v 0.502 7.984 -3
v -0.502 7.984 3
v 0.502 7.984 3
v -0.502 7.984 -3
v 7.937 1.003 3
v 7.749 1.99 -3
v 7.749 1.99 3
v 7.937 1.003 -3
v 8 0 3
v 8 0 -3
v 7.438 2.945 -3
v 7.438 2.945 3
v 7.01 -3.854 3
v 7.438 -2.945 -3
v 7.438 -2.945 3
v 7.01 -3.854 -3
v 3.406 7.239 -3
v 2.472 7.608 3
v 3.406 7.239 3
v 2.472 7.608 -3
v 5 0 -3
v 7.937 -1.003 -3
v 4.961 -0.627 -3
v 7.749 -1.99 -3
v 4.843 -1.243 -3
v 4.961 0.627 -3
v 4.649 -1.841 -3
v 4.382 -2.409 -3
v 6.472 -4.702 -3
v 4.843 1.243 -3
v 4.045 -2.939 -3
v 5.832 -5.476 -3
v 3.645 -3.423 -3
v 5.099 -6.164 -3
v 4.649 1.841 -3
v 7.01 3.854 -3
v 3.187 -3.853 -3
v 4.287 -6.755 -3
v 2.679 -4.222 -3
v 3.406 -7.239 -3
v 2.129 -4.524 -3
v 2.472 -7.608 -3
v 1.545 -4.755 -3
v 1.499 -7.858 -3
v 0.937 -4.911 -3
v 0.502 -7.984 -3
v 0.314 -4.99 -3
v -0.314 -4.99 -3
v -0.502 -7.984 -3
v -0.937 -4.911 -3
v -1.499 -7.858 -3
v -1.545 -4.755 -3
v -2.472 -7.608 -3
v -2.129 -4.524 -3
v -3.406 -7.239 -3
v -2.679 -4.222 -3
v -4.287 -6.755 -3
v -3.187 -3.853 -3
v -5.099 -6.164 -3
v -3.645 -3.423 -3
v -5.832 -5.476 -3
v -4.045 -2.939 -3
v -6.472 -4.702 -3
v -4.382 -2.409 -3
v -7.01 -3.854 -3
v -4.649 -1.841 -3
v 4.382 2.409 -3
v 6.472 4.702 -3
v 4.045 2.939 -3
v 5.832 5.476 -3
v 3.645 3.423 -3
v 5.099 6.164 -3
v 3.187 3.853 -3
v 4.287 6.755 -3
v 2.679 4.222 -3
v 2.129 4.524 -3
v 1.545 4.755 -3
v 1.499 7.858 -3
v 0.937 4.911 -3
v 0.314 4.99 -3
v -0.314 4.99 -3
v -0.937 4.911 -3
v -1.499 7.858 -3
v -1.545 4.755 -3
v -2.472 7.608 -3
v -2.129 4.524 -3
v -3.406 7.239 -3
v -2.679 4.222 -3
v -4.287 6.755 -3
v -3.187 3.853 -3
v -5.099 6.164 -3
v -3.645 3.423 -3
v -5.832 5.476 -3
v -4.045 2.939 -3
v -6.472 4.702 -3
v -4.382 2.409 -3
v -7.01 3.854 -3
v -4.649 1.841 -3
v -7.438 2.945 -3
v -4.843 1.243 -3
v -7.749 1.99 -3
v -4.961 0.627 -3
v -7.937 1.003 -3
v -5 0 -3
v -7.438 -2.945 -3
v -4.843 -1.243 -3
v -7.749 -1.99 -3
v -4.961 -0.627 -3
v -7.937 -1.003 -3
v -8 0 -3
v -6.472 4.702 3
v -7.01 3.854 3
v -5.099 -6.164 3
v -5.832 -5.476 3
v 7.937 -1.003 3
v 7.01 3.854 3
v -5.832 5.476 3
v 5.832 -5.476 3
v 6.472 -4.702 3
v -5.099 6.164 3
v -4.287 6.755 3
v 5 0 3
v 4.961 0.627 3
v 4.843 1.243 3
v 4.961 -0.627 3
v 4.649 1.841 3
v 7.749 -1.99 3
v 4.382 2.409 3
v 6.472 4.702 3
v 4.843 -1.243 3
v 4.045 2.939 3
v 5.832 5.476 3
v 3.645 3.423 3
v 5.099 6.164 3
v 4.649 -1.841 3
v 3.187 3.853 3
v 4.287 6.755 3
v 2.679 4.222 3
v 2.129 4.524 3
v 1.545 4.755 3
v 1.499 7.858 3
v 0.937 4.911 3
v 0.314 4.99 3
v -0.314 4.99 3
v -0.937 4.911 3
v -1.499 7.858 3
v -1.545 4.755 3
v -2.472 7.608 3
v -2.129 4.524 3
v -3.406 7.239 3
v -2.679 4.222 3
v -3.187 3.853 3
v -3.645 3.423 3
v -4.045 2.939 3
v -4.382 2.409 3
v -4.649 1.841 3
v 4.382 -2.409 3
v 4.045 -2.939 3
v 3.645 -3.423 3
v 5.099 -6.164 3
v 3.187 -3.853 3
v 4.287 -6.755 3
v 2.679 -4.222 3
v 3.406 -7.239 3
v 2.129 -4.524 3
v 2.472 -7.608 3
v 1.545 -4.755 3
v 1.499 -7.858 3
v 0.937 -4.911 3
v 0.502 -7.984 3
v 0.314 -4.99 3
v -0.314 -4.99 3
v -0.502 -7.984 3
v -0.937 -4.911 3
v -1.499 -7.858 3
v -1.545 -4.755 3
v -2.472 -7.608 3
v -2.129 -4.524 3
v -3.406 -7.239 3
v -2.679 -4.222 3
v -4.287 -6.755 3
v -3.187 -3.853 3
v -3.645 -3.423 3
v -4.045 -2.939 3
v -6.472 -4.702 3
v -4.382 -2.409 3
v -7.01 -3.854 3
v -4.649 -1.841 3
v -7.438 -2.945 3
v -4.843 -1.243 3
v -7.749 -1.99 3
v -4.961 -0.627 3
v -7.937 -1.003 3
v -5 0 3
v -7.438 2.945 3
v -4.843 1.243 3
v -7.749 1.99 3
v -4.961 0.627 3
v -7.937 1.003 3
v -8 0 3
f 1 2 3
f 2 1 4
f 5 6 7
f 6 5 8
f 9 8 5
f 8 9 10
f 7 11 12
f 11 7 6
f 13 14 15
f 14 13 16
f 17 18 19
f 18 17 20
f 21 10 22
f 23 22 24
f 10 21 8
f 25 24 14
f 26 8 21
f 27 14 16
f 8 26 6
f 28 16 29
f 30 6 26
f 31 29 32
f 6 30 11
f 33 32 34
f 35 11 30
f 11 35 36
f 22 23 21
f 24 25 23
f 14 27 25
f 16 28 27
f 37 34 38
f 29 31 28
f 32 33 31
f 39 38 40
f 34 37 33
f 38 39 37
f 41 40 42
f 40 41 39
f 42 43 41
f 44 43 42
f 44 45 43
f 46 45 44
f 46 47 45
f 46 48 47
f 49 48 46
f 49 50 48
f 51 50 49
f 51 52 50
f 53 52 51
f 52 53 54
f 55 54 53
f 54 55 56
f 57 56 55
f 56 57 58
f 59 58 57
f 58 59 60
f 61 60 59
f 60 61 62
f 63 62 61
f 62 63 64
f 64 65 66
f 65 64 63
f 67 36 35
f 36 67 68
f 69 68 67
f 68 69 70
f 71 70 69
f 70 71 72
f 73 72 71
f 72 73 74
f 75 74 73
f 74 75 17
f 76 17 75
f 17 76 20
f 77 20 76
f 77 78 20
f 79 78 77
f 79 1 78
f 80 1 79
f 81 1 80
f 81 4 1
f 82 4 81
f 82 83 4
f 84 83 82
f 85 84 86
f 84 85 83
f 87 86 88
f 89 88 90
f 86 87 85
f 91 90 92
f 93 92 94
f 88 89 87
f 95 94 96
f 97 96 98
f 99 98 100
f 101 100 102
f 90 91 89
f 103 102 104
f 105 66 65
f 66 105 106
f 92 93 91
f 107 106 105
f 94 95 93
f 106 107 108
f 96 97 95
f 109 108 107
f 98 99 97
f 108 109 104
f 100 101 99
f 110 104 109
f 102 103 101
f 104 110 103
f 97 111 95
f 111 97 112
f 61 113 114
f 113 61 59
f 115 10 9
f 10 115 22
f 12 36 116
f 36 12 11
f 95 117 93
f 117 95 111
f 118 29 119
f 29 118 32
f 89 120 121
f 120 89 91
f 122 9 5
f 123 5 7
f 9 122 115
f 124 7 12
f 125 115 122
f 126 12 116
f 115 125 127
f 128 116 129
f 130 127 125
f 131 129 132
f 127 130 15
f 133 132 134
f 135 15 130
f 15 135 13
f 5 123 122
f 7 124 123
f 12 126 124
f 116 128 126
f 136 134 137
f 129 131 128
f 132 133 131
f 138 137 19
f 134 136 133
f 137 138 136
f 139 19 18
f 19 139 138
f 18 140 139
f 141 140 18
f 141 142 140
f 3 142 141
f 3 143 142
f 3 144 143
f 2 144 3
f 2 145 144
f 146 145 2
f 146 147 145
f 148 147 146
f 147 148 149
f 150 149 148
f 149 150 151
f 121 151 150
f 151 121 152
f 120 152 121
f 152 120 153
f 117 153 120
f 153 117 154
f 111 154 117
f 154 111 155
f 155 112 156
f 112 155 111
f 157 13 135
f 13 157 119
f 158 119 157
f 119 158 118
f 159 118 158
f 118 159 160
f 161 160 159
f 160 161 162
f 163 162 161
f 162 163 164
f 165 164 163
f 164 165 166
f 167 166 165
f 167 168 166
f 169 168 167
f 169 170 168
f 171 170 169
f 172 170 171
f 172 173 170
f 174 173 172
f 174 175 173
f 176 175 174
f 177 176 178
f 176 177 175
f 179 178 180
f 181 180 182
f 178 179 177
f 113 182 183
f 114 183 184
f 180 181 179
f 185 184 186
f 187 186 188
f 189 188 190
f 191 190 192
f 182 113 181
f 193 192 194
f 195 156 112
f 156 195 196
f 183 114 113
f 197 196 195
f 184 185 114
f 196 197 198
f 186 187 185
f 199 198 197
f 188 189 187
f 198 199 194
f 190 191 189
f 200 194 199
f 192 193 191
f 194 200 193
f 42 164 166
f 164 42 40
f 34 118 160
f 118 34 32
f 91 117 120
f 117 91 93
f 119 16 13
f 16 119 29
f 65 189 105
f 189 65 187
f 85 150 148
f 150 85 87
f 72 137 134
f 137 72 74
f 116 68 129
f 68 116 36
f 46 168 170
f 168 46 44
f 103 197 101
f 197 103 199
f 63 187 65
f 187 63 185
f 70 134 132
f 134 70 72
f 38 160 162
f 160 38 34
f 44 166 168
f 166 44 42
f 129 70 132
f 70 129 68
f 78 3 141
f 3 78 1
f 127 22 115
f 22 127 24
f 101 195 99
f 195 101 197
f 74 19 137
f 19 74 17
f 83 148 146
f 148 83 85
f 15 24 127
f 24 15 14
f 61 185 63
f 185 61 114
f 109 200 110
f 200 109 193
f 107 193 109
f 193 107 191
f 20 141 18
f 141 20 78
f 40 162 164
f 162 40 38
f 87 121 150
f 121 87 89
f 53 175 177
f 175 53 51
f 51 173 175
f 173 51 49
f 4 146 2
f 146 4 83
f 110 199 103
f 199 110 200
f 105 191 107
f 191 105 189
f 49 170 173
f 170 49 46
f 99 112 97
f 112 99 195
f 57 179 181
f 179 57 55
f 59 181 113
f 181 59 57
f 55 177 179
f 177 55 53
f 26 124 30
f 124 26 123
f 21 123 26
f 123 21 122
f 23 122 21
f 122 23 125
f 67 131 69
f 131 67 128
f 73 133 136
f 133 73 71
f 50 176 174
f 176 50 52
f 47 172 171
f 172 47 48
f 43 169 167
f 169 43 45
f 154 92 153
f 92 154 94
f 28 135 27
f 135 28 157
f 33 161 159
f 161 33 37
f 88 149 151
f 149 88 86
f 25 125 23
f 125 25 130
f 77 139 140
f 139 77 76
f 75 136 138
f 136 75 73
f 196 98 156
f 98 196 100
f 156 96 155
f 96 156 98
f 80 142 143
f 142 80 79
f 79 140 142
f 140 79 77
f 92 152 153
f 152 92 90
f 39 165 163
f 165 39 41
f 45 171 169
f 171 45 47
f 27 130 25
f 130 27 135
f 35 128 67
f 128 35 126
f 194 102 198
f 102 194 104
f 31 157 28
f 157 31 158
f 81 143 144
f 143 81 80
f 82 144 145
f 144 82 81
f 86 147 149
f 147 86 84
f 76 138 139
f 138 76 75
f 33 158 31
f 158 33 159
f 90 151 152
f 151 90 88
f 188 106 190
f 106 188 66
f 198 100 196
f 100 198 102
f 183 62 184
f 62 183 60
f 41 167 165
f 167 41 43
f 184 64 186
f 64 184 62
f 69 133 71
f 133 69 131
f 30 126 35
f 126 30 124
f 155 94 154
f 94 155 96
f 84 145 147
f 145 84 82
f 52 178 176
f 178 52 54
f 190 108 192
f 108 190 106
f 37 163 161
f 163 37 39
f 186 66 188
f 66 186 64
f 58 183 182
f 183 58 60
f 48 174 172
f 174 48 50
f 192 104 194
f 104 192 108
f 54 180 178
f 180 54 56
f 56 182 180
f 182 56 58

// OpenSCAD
$fn = 50;


difference() {
	union() {
		translate(v = [0, 0, -3.0000000000]) {
			cylinder(h = 6, r = 8.0000000000);
		}
	}
	union() {
		translate(v = [0, 0, -100.0000000000]) {
			cylinder(h = 200, r = 5.0000000000);
		}
	}
}
